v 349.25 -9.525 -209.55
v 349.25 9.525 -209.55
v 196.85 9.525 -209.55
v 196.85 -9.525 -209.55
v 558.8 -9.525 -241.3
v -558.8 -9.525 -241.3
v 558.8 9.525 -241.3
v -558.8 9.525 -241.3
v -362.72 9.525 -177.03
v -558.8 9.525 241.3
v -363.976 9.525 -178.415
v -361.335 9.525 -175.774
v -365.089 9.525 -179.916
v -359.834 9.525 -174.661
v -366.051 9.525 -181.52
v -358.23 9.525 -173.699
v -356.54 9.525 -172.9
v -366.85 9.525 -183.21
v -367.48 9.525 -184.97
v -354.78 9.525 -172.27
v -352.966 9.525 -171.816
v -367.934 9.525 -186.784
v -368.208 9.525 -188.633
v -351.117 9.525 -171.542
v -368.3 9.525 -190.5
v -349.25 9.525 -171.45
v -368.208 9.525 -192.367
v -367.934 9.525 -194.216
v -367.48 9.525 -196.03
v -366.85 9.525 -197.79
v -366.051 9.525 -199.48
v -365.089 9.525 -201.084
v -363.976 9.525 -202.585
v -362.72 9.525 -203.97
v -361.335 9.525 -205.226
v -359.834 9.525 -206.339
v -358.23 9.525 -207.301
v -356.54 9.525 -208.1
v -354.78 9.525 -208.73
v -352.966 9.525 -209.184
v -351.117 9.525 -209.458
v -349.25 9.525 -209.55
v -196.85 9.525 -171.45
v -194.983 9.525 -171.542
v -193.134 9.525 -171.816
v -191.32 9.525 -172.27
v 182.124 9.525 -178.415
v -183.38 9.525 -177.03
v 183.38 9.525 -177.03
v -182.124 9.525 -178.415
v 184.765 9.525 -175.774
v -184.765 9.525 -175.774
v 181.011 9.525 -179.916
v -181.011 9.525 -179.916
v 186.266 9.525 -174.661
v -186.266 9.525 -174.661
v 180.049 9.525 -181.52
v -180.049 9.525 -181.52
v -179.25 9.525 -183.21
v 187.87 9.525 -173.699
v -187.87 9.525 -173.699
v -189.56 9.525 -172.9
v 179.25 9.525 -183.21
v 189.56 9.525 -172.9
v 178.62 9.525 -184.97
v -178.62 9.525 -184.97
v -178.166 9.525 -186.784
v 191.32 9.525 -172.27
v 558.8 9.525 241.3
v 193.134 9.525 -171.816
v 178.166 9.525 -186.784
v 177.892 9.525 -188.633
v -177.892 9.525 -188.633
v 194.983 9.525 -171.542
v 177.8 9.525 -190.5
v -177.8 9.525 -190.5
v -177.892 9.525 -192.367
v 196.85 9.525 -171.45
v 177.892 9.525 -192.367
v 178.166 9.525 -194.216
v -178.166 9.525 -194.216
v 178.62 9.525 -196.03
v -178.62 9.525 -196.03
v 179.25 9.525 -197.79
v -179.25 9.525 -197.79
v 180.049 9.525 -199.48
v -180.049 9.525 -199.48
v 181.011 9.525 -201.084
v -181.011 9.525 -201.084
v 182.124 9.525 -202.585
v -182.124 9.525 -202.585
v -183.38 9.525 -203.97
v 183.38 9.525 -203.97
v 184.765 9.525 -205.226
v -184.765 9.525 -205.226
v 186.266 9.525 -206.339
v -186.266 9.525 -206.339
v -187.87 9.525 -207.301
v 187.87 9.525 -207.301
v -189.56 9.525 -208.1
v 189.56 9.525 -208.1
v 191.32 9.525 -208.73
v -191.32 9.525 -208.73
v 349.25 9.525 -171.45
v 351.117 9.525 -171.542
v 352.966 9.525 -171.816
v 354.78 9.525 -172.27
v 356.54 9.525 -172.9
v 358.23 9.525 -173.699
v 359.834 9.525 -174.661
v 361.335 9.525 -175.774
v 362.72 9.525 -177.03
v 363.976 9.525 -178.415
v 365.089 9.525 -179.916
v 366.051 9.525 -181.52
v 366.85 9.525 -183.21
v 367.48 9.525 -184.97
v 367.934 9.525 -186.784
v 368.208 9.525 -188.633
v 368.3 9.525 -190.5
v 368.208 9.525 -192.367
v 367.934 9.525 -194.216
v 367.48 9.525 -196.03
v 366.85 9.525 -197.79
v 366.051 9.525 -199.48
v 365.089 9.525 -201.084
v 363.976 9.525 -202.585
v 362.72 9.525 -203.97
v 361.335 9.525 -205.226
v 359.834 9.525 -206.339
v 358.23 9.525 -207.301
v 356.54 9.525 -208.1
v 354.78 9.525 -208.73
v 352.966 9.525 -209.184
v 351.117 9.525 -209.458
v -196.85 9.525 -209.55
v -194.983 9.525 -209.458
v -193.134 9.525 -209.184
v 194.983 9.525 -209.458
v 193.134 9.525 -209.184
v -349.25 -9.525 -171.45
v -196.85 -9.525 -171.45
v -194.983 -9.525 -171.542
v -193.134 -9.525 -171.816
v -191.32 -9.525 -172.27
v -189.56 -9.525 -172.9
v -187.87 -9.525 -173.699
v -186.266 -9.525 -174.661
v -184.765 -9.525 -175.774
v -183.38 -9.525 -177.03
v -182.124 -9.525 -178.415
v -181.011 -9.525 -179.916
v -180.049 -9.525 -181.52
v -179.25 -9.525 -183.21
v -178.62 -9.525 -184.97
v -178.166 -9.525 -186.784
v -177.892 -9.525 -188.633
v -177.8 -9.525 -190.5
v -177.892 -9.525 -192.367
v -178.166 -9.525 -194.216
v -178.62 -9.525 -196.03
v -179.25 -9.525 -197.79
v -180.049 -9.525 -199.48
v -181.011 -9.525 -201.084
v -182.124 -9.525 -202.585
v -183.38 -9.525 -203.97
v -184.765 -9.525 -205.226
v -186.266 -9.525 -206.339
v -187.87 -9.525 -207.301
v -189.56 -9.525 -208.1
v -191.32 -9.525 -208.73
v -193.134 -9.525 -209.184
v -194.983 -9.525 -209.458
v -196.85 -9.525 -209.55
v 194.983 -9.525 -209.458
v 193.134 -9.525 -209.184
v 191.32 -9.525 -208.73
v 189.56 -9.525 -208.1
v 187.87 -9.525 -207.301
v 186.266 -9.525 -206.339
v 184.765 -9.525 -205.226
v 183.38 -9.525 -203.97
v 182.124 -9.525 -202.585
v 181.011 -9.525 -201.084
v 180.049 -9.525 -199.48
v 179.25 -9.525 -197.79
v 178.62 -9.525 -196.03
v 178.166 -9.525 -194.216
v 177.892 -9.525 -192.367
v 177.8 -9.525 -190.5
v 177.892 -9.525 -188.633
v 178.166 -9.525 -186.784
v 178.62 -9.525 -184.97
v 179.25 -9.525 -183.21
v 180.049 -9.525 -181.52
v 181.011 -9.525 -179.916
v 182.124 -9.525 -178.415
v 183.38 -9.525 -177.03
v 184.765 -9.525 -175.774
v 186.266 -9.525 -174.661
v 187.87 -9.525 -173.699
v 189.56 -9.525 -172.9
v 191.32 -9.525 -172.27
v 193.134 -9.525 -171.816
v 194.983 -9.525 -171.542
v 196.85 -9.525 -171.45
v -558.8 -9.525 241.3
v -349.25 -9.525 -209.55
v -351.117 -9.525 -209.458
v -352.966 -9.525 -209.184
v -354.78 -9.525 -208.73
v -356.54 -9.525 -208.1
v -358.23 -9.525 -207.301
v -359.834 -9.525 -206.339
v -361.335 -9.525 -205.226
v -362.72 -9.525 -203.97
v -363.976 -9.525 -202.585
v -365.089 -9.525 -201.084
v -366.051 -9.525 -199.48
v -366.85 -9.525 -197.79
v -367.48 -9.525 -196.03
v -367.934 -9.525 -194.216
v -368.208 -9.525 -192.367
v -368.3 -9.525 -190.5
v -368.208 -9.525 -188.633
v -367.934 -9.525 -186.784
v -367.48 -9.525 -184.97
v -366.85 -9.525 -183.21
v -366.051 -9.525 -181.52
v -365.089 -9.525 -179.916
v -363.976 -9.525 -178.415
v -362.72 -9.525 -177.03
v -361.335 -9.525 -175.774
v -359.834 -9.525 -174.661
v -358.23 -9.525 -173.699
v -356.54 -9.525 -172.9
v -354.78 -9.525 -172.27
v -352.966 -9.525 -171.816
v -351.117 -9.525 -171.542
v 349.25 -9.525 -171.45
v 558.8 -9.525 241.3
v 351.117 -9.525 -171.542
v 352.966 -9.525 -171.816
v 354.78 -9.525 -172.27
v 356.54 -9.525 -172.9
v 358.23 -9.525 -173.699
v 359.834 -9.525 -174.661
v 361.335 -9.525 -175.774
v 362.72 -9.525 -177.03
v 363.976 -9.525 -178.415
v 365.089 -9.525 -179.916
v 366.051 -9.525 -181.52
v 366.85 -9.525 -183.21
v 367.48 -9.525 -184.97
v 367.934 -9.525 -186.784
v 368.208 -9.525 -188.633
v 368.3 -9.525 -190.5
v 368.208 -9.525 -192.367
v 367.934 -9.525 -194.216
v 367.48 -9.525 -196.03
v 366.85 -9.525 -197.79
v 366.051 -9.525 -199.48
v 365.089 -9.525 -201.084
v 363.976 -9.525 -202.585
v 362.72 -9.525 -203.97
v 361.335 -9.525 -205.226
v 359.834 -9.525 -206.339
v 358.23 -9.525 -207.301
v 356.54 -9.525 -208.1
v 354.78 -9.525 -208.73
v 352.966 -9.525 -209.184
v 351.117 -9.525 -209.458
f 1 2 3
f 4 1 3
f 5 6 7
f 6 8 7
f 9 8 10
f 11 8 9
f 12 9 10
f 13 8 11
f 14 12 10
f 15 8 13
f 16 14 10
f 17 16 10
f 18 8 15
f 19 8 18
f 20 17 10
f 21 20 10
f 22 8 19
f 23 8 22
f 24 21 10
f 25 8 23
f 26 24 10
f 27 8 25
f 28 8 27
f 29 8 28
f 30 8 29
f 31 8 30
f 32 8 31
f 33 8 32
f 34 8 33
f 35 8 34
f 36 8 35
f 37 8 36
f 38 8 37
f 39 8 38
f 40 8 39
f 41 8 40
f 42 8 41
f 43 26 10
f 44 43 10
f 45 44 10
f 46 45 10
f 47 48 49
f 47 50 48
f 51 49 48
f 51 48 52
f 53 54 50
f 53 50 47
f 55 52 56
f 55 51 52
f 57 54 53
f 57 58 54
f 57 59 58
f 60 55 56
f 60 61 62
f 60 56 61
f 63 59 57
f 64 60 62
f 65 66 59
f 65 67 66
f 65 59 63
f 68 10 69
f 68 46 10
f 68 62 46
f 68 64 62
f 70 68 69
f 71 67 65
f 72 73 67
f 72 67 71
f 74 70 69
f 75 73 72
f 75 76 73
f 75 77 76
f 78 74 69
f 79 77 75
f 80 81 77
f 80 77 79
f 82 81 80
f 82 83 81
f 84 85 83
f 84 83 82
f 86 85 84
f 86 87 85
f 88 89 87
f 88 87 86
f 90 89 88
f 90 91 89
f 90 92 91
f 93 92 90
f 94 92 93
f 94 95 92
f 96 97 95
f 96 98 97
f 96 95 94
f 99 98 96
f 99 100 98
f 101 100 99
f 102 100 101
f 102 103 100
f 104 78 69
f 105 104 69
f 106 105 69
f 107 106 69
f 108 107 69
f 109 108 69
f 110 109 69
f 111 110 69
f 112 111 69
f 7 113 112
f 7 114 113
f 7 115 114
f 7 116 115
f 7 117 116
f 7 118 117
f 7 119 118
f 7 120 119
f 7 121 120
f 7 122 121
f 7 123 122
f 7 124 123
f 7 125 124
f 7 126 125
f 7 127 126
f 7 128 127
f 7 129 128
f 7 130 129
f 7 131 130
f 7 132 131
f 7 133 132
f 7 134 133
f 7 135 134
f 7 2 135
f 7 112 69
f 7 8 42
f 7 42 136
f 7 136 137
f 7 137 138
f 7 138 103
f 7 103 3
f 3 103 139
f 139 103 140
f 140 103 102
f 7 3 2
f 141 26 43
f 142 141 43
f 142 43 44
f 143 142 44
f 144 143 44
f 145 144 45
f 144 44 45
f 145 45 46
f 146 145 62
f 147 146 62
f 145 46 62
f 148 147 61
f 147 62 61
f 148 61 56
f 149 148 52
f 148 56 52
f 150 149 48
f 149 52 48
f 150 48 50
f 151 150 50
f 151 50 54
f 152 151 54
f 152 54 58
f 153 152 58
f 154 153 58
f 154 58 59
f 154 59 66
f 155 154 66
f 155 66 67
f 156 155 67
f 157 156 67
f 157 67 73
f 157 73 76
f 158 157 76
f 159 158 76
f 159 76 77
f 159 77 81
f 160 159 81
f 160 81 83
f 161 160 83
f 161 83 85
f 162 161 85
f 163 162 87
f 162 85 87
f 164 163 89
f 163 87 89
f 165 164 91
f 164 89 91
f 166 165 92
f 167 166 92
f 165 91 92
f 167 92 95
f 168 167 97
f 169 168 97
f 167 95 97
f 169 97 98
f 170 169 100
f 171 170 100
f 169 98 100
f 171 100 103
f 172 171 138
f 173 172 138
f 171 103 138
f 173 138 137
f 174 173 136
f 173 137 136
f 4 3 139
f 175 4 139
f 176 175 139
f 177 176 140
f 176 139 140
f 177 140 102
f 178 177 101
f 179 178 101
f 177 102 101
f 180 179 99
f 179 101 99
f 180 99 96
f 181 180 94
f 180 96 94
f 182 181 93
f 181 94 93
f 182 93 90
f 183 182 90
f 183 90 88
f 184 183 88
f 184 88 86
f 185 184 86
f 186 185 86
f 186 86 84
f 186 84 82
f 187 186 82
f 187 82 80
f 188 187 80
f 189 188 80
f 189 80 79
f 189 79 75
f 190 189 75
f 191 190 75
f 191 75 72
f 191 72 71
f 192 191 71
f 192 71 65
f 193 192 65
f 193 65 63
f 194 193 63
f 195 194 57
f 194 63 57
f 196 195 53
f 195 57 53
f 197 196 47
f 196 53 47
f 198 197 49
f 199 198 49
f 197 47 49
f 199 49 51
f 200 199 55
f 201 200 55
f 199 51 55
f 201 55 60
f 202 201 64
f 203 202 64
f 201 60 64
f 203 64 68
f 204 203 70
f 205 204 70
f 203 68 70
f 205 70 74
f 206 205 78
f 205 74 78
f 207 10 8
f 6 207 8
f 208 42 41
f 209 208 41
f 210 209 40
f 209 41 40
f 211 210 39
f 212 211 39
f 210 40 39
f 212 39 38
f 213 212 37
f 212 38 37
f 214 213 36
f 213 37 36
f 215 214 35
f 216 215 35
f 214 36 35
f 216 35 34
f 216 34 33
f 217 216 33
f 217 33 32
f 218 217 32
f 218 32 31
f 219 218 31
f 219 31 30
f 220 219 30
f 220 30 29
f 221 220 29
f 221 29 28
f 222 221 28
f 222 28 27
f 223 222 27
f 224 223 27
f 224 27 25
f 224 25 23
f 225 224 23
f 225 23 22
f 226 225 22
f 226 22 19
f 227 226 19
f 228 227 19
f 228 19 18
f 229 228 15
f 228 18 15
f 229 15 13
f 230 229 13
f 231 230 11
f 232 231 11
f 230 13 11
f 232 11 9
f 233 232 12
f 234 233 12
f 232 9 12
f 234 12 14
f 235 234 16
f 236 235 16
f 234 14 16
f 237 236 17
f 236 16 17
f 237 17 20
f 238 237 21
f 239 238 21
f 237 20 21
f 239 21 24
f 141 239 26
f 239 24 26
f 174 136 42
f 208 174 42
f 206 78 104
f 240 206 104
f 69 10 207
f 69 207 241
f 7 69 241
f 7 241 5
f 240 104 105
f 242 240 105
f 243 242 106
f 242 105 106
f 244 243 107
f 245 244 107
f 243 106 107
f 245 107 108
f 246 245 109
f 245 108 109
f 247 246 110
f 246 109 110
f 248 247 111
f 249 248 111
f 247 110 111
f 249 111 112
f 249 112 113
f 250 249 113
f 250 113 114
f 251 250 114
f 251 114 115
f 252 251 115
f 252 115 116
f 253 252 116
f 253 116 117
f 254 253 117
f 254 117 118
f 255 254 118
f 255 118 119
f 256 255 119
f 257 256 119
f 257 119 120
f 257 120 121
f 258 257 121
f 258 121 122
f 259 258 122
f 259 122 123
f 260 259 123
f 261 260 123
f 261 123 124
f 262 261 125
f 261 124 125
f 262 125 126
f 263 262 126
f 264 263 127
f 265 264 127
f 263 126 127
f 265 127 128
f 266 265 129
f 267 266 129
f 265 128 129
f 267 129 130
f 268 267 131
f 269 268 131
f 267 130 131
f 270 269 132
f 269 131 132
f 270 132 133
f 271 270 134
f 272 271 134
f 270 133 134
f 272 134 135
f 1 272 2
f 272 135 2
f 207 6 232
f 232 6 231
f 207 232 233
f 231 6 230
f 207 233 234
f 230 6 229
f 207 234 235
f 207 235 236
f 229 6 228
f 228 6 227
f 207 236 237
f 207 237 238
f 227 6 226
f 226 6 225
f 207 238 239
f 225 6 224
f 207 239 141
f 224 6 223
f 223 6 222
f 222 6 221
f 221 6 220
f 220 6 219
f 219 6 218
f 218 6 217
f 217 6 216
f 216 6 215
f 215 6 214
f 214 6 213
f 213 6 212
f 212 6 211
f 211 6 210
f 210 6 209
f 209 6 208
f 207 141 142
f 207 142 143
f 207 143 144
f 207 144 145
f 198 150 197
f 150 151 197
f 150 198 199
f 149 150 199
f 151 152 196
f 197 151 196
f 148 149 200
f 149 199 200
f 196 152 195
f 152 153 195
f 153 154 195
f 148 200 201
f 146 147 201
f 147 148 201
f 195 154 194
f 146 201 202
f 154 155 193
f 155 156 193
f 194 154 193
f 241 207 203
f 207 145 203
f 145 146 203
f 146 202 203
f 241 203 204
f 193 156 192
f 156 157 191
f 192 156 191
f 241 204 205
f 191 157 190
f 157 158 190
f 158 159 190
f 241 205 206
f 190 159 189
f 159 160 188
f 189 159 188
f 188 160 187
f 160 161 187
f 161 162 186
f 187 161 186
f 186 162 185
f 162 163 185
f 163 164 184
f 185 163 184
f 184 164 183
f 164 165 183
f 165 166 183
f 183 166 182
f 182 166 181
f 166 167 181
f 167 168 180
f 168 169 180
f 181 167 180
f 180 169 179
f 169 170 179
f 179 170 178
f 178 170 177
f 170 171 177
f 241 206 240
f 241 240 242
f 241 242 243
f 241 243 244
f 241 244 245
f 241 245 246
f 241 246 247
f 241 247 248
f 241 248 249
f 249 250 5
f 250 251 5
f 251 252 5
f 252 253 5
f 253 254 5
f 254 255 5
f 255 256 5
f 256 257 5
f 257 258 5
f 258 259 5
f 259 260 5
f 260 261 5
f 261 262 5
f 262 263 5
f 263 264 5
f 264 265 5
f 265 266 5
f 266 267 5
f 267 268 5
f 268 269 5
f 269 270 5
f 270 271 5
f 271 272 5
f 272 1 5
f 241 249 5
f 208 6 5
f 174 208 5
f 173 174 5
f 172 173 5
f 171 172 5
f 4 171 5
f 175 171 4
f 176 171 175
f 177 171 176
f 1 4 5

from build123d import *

# Parameters (mm, degrees)
SKETCH1_W               = 1117.6
SKETCH1_H               = 482.6
BOSS_EXTRUDE1_DEPTH     = 9.525
CUT_EXTRUDE1_DEPTH      = 609.971290374
CUT_EXTRUDE1_DEPTH_BACK = 609.971290374


with BuildPart() as part:
    # Sketch1 → Boss-Extrude1 (new, symmetric)
    with BuildSketch(Plane(origin=(0, 0, 0), x_dir=(1, 0, 0), z_dir=(0, 1, 0))):
        Rectangle(SKETCH1_W, SKETCH1_H)
    extrude(amount=BOSS_EXTRUDE1_DEPTH, both=True)

    # Sketch2 → Cut-Extrude1 (cut, two sides: drawn at the far end of the back side and taken through both)
    with BuildSketch(Plane.XZ.offset(9.525).offset(-CUT_EXTRUDE1_DEPTH_BACK)):
        with BuildLine():
            Line((-349.25, -171.45), (-196.85, -171.45))
            ThreePointArc((-196.85, -171.45), (-177.8, -190.5), (-196.85, -209.55))
            Line((-196.85, -209.55), (-349.25, -209.55))
            ThreePointArc((-349.25, -209.55), (-368.3, -190.5), (-349.25, -171.45))
        make_face()
        with BuildLine():
            Line((196.85, -171.45), (349.25, -171.45))
            ThreePointArc((349.25, -171.45), (368.3, -190.5), (349.25, -209.55))
            Line((349.25, -209.55), (196.85, -209.55))
            ThreePointArc((196.85, -209.55), (177.8, -190.5), (196.85, -171.45))
        make_face()
    extrude(amount=CUT_EXTRUDE1_DEPTH + CUT_EXTRUDE1_DEPTH_BACK, mode=Mode.SUBTRACT)


solid = part.part
